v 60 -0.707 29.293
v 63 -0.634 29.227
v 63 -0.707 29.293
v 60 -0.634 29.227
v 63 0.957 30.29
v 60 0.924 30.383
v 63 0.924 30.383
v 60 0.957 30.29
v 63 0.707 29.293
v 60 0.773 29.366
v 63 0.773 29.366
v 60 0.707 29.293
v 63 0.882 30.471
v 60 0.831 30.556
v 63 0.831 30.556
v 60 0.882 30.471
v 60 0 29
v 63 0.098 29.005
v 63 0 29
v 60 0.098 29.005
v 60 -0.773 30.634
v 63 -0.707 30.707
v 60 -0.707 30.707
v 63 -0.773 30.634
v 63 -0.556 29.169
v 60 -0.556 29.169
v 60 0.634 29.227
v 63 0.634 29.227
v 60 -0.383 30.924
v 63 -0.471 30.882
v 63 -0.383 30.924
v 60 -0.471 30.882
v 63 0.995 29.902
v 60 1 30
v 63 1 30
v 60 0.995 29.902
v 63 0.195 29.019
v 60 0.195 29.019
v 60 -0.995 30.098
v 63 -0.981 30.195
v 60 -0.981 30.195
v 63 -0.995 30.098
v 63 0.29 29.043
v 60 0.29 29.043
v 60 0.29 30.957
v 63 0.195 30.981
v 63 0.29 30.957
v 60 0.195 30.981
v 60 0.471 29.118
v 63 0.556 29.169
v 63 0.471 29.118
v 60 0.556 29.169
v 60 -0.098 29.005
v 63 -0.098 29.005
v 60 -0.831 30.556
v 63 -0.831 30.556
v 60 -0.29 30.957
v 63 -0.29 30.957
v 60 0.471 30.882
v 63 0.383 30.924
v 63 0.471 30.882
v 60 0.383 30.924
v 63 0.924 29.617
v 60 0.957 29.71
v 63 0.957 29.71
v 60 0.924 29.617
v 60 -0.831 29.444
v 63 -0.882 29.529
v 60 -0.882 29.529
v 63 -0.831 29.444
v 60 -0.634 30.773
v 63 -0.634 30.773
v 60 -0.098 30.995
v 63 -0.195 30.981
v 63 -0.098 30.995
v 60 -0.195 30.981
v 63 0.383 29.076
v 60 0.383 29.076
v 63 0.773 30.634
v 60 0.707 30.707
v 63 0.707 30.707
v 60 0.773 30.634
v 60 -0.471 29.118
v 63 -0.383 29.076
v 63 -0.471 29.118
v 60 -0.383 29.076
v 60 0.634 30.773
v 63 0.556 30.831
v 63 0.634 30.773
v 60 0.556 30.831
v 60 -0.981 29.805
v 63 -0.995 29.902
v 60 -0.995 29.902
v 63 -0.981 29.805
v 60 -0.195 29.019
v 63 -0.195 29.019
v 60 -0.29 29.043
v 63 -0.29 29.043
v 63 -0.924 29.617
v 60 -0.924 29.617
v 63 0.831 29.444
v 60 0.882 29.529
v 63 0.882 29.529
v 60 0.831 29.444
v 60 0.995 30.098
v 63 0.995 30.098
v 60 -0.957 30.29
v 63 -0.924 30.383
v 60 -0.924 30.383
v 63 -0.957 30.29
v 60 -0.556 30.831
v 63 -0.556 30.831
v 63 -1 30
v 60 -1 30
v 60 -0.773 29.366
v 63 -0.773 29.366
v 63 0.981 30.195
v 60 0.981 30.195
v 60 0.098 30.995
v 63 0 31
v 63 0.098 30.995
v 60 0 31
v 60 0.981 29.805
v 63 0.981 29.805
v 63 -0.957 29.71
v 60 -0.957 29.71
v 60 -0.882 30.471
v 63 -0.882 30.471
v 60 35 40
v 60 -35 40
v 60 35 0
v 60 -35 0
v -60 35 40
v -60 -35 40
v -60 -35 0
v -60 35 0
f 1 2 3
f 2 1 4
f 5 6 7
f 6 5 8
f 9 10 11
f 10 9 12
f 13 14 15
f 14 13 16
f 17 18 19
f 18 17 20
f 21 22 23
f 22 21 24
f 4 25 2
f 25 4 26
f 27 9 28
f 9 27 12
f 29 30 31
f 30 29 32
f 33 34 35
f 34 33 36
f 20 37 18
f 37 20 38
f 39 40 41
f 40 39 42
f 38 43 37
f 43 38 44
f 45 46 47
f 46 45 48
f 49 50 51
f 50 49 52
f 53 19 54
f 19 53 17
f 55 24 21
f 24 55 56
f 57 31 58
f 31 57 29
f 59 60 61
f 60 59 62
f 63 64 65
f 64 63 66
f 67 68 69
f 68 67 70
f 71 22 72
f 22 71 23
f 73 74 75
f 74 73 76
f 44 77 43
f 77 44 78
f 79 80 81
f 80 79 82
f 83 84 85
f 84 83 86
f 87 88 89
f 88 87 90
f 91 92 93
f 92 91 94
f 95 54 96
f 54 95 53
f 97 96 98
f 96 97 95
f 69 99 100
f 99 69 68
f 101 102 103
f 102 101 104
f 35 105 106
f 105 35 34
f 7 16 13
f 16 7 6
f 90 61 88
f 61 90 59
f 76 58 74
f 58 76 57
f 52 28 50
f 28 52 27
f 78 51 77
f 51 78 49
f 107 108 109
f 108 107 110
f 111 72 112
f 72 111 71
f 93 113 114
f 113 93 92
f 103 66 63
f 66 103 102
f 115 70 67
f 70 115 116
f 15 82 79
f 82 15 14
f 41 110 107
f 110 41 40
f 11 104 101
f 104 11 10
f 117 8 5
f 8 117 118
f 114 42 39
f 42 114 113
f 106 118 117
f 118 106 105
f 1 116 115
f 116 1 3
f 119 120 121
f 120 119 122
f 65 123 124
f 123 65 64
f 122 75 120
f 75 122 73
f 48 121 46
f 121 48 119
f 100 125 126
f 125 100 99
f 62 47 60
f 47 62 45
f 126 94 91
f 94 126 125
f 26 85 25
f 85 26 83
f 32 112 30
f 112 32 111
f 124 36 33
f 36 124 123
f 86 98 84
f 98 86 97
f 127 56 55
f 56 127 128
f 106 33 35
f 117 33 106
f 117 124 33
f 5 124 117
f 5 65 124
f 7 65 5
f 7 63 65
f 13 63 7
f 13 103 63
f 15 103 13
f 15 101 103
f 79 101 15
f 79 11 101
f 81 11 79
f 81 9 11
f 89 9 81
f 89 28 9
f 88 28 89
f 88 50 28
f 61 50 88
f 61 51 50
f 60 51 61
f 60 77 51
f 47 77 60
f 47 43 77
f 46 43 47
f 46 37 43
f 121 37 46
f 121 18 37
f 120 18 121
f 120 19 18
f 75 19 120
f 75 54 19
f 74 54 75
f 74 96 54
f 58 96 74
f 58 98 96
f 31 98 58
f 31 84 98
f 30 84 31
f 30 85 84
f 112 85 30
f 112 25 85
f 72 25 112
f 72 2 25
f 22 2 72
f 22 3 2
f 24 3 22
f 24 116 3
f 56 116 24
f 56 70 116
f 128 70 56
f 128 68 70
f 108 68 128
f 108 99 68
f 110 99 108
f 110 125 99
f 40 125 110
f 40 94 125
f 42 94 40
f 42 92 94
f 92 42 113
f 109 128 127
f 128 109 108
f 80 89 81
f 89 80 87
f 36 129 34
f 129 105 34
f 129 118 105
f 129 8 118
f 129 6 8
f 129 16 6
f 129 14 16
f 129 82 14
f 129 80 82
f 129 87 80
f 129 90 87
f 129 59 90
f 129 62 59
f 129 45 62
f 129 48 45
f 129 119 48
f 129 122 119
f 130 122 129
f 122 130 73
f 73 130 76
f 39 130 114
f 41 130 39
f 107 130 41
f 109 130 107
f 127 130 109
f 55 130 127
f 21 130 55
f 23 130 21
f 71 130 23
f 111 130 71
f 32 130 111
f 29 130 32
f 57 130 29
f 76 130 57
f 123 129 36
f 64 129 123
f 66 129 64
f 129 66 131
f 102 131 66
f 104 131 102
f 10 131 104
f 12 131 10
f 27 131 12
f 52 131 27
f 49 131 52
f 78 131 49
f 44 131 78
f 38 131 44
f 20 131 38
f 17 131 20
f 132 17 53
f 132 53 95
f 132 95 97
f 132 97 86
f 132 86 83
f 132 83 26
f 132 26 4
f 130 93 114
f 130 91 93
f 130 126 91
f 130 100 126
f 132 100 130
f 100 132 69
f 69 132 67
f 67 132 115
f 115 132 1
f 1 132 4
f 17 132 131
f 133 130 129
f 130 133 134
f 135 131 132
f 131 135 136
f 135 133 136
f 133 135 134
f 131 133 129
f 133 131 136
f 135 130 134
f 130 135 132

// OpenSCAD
// Mini horizontal gel-electrophoresis box: open-top rectangular tank with a central
// raised gel-tray platform that divides the bottom into two buffer chambers.
// Print orientation: tank rests on the XY plane (z = 0) and builds upward (+Z).

$fn = 64;

// ---------------- Dimensions (mm) ----------------
outer_x      = 120;   // tank outer length (X)
outer_y      = 70;    // tank outer width (Y)
outer_h      = 40;    // tank outer height (Z)

wall         = 3;     // tank wall thickness
floor        = 3;     // tank floor thickness

platform_x   = 60;    // platform length (X), centred
platform_w   = outer_y; // platform spans full inner width (Y)
platform_top = 13;    // platform top height (Z) = inner floor (3) + 10

hole_d       = 2;     // electrode hole diameter
hole_y       = 0;     // electrode hole Y position
hole_z       = 30;    // electrode hole Z position

eps          = 0.5;   // overshoot for clean boolean cuts

// ---------------- Derived ----------------
inner_x = outer_x - 2 * wall;     // 114
inner_z = outer_h - floor;        // 37 (inner floor is at z = 3)

// ---------------- Model ----------------
union() {
    // Tank body (outer solid)
    translate([-outer_x / 2, -outer_y / 2, 0])
        cube([outer_x, outer_y, outer_h]);

    // Central platform for the gel tray
    translate([-platform_x / 2, -platform_w / 2, floor])
        cube([platform_x, platform_w, platform_top - floor]);

    // Electrode holes through each end wall, along X
    for (sx = [-1, 1])
        translate([sx * (outer_x / 2 - eps), hole_y, hole_z])
            rotate([0, 90, 0])
                cylinder(d = hole_d, h = wall + eps);
}
